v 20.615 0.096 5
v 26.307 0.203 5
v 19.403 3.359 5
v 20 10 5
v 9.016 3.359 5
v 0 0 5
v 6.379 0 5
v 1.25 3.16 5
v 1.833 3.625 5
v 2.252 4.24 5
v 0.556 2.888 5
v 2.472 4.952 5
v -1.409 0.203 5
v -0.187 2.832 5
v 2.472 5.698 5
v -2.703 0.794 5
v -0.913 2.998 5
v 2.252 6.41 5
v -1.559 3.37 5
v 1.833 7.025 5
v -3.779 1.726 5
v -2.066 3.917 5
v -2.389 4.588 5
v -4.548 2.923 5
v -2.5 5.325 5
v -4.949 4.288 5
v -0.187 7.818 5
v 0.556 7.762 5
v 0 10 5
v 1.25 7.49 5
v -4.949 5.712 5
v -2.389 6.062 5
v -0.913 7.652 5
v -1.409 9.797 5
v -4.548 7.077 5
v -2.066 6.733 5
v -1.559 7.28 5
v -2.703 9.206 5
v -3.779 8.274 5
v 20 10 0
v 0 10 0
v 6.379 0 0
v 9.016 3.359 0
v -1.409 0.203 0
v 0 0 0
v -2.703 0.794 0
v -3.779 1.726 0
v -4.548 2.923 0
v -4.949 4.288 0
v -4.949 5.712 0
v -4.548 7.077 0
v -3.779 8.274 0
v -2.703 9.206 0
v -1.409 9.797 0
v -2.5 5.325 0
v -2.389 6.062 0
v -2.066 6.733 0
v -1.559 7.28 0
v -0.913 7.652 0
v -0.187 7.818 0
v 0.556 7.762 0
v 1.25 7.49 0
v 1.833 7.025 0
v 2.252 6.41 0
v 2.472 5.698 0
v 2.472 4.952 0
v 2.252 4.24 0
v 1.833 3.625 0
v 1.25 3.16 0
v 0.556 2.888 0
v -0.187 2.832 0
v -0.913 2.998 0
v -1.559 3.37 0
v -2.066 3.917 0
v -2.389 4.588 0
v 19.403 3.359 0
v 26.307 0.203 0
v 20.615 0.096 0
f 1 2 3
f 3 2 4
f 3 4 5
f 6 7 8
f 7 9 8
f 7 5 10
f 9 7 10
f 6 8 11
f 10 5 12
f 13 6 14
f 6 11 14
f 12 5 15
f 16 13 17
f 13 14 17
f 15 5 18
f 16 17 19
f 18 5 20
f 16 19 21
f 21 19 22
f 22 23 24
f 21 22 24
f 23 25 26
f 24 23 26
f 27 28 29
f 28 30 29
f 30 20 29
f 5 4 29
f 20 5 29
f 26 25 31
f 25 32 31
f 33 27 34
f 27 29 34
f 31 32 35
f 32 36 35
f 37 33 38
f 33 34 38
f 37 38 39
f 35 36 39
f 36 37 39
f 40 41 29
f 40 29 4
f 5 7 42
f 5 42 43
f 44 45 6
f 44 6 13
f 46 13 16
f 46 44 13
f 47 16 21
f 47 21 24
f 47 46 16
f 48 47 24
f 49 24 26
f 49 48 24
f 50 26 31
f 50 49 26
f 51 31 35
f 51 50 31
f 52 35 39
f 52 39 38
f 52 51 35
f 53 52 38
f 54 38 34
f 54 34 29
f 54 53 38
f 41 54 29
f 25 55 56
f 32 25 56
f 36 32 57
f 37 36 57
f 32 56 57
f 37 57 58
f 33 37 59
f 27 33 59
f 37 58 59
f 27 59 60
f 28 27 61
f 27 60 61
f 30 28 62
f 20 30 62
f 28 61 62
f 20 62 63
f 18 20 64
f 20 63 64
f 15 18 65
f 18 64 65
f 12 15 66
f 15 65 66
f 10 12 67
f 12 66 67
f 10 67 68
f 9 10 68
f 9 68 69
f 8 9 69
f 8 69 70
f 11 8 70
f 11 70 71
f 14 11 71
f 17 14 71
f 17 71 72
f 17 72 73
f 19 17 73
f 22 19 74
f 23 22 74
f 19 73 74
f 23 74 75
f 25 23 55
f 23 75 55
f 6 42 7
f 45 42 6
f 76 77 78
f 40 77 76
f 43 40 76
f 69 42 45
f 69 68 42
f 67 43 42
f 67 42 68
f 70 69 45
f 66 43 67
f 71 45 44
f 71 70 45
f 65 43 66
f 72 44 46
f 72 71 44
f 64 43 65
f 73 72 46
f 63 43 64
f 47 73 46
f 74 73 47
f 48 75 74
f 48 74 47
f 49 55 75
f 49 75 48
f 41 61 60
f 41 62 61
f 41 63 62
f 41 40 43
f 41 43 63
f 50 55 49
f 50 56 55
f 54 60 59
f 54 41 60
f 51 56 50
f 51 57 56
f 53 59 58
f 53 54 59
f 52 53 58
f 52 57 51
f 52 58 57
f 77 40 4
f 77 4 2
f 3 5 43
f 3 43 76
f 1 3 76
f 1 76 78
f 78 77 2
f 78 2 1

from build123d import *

# Parameters (mm, degrees)
BOSS_EXTRUDE2_DEPTH = 5
CUT_EXTRUDE1_DEPTH  = 5
CUT_EXTRUDE2_DEPTH  = 5
SKETCH7_R           = 2.5
CUT_EXTRUDE3_DEPTH  = 5


with BuildPart() as part:
    # Sketch4 → Boss-Extrude2 (new body)
    with BuildSketch(Plane.XY):
        with BuildLine():
            Line((0, 10), (20, 10))
            Line((20, 10), (26.307466479, 0.203296746))
            Line((26.307466479, 0.203296746), (15.504252616, 0))
            Line((15.504252616, 0), (0, 0))
            ThreePointArc((0, 0), (-5, 5), (0, 10))
        make_face()
    extrude(amount=BOSS_EXTRUDE2_DEPTH)

    # Sketch5 → Cut-Extrude1 (cut)
    with BuildSketch(Plane.XY.offset(5)):
        Polygon((6.379128738, 0), (9.016156307, 3.359284814), (19.402963043, 3.359284814), (20.614889369, 0.096172846), align=None)
    extrude(amount=-CUT_EXTRUDE1_DEPTH, mode=Mode.SUBTRACT)

    # Sketch6 → Cut-Extrude2 (cut)
    with BuildSketch(Plane(origin=(0, 0, 0), x_dir=(-1, 0, 0), z_dir=(0, 0, -1))):
        Polygon((-20.614889369, 0.096172846), (-6.379128738, 0), (-6.379128738, -1.250967918), (-21.241056997, -1.250967918), align=None)
    extrude(amount=-CUT_EXTRUDE2_DEPTH, mode=Mode.SUBTRACT)

    # Sketch7 → Cut-Extrude3 (cut)
    with BuildSketch(Plane(origin=(0, 0, 0), x_dir=(-1, 0, 0), z_dir=(0, 0, -1))):
        with Locations((0, 5.324946676)):
            Circle(SKETCH7_R)
    extrude(amount=-CUT_EXTRUDE3_DEPTH, mode=Mode.SUBTRACT)


solid = part.part
